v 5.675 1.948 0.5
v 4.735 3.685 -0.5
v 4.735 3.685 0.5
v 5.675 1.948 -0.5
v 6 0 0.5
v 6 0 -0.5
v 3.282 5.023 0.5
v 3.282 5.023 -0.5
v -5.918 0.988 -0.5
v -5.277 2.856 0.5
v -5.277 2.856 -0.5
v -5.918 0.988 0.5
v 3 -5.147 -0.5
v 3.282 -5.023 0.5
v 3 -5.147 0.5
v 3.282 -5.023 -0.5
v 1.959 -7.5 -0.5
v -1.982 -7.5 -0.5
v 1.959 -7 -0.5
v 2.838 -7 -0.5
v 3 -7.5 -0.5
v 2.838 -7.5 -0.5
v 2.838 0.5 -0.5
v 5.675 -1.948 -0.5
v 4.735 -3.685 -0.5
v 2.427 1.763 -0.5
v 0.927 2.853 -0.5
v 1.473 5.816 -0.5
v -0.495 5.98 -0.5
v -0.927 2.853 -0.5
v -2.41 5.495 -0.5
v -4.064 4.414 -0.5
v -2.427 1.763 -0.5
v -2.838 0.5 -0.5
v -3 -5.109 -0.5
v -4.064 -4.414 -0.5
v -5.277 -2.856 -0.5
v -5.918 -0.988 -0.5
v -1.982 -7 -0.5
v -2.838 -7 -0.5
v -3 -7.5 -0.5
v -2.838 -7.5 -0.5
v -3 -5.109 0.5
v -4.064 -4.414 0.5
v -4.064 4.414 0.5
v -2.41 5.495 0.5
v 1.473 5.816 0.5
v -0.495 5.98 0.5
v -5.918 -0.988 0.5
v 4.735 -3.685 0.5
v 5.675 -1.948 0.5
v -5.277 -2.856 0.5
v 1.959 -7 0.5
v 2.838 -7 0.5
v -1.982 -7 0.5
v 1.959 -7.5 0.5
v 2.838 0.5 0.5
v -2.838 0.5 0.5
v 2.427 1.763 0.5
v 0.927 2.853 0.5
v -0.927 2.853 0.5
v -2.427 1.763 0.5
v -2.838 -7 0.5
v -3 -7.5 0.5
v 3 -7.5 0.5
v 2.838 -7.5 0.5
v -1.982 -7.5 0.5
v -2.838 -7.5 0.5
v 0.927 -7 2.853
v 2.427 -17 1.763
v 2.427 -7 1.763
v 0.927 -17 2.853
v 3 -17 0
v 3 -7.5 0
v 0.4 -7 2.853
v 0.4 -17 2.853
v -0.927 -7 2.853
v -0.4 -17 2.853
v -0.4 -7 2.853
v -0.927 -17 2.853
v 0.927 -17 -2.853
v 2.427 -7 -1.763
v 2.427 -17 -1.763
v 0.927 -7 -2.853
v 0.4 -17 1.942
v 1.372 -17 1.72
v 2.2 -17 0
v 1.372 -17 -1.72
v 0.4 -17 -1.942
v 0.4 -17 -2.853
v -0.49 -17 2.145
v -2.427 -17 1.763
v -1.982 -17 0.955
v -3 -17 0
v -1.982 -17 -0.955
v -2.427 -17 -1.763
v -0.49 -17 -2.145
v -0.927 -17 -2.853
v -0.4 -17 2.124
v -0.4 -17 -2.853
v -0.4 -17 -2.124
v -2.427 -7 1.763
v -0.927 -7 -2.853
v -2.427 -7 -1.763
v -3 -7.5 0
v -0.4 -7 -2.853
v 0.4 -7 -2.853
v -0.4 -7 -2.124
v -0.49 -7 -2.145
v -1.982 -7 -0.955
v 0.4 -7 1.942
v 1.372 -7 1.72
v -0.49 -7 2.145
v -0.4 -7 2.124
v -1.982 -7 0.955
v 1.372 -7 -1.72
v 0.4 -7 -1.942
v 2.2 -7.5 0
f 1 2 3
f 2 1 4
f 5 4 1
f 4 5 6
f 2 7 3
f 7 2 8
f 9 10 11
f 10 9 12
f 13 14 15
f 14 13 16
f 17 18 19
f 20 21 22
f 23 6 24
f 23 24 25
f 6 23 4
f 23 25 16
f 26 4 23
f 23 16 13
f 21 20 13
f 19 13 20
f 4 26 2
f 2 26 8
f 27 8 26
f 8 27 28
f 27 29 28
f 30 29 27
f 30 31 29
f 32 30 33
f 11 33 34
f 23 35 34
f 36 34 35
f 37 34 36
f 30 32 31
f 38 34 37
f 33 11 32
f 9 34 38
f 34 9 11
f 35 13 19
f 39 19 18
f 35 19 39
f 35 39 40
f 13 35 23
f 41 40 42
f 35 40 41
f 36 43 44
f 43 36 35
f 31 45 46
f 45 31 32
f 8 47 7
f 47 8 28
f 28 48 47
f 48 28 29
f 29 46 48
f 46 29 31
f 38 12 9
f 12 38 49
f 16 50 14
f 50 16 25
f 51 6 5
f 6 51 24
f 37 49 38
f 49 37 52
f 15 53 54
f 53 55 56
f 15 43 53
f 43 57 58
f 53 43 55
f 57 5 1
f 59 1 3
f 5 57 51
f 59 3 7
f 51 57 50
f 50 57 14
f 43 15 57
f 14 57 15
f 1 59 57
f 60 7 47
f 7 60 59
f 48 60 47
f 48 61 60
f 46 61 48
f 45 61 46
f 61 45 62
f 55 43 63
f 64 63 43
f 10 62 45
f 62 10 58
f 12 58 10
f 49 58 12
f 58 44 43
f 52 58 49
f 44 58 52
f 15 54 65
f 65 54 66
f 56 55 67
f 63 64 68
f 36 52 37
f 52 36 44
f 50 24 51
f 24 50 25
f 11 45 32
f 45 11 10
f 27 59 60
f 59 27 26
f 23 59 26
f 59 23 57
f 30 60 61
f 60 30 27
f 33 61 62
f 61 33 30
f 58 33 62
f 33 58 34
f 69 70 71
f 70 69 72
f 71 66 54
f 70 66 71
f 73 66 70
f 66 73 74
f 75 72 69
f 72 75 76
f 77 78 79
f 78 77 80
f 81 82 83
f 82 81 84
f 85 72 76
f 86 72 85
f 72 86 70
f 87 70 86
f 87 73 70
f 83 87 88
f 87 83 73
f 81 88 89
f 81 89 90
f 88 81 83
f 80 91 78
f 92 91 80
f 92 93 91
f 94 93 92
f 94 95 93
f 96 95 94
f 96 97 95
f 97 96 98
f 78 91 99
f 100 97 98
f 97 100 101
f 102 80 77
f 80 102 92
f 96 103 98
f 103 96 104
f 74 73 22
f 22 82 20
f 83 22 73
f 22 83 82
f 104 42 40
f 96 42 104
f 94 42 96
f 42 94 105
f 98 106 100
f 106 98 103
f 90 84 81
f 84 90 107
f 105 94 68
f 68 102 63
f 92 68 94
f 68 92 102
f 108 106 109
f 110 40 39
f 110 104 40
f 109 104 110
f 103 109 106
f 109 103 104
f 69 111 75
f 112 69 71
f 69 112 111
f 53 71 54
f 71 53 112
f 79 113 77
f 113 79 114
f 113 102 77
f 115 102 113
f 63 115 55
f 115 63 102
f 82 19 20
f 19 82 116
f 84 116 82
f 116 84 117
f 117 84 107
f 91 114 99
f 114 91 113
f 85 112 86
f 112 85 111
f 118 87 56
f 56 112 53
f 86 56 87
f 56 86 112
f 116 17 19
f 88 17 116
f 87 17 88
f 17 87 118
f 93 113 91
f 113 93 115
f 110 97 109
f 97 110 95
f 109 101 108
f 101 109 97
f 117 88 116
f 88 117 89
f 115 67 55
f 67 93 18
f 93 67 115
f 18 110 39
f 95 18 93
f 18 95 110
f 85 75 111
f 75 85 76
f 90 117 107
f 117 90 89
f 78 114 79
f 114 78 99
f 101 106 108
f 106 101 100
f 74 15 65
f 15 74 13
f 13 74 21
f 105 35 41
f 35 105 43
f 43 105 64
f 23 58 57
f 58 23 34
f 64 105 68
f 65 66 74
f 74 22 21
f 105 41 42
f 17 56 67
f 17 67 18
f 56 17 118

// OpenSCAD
// Parameters
ring_outer_diameter_mm = 12; //[6:24:1]
ring_inner_diameter_mm = 6; //[3:12:1]
thickness_mm = 1; //[0.5:2:0.1]
lug_width_mm = 6; //[3:12:1]
overall_length_mm = 25; //[13:50:1]
crimp_length_mm = 10; //[5:20:1]
crimp_enabled = 1; //[0:1:1]
bend_angle_deg = 45; //[0:90:5]
wire_entry_slot_enabled = 1; //[0:1:1]
overlap_mm = 1; //[0.5:2:0.1]
transition_length_mm = 2; //[1:5:0.5]
barrel_wall_mm = 0.8; //[0.4:1.6:0.1]
slot_width_mm = 0.8; //[0.4:2:0.1]

// Ring Terminal - complete geometry
module ring_terminal() {
  color("Silver") {
    difference() {
      // Ring Lug Body
      translate([0, 0, 0])
        cylinder(r=ring_outer_diameter_mm/2, h=thickness_mm, center=true);
      // Ring Hole
      translate([0, 0, 0])
        cylinder(r=ring_inner_diameter_mm/2, h=thickness_mm + 2*overlap_mm, center=true);
    }
  }
}

// Ring Terminal Assembly - complete geometry
module ring_terminal_assembly() {
  color("Silver") {
    union() {
      // Ring Terminal
      ring_terminal();
      
      // Tongue Neck Transition
      translate([0, -(ring_outer_diameter_mm/2 + transition_length_mm)/2 + overlap_mm/2, 0])
        cube([lug_width_mm, ring_outer_diameter_mm/2 + transition_length_mm, thickness_mm], center=true);
      
      // Crimp Barrel or Bent Tongue
      if (crimp_enabled) {
        difference() {
          // Crimp Barrel Outer
          translate([0, -(ring_outer_diameter_mm/2 + transition_length_mm) - crimp_length_mm/2 + overlap_mm, 0])
            rotate([90, 0, 0])
            cylinder(r=lug_width_mm/2, h=crimp_length_mm, center=true);
          // Crimp Barrel Inner
          translate([0, -(ring_outer_diameter_mm/2 + transition_length_mm) - crimp_length_mm/2 + overlap_mm, 0])
            rotate([90, 0, 0])
            cylinder(r=max(lug_width_mm/2 - barrel_wall_mm, lug_width_mm/4), h=crimp_length_mm + 2*overlap_mm, center=true);
          // Wire Entry Slot Cut
          if (wire_entry_slot_enabled) {
            translate([0, -(ring_outer_diameter_mm/2 + transition_length_mm) - crimp_length_mm/2 + overlap_mm, 0])
              cube([slot_width_mm, crimp_length_mm + 2*overlap_mm, lug_width_mm + 2*overlap_mm], center=true);
          }
        }
      } else {
        // Bent Tongue
        translate([0, -(ring_outer_diameter_mm/2) - (overall_length_mm - ring_outer_diameter_mm/2)/2 + overlap_mm, 0])
          rotate([bend_angle_deg, 0, 0])
          cube([lug_width_mm, overall_length_mm - ring_outer_diameter_mm/2, thickness_mm], center=true);
      }
    }
  }
}

// Assembly
module assembly() {
  ring_terminal_assembly();
}

assembly();
